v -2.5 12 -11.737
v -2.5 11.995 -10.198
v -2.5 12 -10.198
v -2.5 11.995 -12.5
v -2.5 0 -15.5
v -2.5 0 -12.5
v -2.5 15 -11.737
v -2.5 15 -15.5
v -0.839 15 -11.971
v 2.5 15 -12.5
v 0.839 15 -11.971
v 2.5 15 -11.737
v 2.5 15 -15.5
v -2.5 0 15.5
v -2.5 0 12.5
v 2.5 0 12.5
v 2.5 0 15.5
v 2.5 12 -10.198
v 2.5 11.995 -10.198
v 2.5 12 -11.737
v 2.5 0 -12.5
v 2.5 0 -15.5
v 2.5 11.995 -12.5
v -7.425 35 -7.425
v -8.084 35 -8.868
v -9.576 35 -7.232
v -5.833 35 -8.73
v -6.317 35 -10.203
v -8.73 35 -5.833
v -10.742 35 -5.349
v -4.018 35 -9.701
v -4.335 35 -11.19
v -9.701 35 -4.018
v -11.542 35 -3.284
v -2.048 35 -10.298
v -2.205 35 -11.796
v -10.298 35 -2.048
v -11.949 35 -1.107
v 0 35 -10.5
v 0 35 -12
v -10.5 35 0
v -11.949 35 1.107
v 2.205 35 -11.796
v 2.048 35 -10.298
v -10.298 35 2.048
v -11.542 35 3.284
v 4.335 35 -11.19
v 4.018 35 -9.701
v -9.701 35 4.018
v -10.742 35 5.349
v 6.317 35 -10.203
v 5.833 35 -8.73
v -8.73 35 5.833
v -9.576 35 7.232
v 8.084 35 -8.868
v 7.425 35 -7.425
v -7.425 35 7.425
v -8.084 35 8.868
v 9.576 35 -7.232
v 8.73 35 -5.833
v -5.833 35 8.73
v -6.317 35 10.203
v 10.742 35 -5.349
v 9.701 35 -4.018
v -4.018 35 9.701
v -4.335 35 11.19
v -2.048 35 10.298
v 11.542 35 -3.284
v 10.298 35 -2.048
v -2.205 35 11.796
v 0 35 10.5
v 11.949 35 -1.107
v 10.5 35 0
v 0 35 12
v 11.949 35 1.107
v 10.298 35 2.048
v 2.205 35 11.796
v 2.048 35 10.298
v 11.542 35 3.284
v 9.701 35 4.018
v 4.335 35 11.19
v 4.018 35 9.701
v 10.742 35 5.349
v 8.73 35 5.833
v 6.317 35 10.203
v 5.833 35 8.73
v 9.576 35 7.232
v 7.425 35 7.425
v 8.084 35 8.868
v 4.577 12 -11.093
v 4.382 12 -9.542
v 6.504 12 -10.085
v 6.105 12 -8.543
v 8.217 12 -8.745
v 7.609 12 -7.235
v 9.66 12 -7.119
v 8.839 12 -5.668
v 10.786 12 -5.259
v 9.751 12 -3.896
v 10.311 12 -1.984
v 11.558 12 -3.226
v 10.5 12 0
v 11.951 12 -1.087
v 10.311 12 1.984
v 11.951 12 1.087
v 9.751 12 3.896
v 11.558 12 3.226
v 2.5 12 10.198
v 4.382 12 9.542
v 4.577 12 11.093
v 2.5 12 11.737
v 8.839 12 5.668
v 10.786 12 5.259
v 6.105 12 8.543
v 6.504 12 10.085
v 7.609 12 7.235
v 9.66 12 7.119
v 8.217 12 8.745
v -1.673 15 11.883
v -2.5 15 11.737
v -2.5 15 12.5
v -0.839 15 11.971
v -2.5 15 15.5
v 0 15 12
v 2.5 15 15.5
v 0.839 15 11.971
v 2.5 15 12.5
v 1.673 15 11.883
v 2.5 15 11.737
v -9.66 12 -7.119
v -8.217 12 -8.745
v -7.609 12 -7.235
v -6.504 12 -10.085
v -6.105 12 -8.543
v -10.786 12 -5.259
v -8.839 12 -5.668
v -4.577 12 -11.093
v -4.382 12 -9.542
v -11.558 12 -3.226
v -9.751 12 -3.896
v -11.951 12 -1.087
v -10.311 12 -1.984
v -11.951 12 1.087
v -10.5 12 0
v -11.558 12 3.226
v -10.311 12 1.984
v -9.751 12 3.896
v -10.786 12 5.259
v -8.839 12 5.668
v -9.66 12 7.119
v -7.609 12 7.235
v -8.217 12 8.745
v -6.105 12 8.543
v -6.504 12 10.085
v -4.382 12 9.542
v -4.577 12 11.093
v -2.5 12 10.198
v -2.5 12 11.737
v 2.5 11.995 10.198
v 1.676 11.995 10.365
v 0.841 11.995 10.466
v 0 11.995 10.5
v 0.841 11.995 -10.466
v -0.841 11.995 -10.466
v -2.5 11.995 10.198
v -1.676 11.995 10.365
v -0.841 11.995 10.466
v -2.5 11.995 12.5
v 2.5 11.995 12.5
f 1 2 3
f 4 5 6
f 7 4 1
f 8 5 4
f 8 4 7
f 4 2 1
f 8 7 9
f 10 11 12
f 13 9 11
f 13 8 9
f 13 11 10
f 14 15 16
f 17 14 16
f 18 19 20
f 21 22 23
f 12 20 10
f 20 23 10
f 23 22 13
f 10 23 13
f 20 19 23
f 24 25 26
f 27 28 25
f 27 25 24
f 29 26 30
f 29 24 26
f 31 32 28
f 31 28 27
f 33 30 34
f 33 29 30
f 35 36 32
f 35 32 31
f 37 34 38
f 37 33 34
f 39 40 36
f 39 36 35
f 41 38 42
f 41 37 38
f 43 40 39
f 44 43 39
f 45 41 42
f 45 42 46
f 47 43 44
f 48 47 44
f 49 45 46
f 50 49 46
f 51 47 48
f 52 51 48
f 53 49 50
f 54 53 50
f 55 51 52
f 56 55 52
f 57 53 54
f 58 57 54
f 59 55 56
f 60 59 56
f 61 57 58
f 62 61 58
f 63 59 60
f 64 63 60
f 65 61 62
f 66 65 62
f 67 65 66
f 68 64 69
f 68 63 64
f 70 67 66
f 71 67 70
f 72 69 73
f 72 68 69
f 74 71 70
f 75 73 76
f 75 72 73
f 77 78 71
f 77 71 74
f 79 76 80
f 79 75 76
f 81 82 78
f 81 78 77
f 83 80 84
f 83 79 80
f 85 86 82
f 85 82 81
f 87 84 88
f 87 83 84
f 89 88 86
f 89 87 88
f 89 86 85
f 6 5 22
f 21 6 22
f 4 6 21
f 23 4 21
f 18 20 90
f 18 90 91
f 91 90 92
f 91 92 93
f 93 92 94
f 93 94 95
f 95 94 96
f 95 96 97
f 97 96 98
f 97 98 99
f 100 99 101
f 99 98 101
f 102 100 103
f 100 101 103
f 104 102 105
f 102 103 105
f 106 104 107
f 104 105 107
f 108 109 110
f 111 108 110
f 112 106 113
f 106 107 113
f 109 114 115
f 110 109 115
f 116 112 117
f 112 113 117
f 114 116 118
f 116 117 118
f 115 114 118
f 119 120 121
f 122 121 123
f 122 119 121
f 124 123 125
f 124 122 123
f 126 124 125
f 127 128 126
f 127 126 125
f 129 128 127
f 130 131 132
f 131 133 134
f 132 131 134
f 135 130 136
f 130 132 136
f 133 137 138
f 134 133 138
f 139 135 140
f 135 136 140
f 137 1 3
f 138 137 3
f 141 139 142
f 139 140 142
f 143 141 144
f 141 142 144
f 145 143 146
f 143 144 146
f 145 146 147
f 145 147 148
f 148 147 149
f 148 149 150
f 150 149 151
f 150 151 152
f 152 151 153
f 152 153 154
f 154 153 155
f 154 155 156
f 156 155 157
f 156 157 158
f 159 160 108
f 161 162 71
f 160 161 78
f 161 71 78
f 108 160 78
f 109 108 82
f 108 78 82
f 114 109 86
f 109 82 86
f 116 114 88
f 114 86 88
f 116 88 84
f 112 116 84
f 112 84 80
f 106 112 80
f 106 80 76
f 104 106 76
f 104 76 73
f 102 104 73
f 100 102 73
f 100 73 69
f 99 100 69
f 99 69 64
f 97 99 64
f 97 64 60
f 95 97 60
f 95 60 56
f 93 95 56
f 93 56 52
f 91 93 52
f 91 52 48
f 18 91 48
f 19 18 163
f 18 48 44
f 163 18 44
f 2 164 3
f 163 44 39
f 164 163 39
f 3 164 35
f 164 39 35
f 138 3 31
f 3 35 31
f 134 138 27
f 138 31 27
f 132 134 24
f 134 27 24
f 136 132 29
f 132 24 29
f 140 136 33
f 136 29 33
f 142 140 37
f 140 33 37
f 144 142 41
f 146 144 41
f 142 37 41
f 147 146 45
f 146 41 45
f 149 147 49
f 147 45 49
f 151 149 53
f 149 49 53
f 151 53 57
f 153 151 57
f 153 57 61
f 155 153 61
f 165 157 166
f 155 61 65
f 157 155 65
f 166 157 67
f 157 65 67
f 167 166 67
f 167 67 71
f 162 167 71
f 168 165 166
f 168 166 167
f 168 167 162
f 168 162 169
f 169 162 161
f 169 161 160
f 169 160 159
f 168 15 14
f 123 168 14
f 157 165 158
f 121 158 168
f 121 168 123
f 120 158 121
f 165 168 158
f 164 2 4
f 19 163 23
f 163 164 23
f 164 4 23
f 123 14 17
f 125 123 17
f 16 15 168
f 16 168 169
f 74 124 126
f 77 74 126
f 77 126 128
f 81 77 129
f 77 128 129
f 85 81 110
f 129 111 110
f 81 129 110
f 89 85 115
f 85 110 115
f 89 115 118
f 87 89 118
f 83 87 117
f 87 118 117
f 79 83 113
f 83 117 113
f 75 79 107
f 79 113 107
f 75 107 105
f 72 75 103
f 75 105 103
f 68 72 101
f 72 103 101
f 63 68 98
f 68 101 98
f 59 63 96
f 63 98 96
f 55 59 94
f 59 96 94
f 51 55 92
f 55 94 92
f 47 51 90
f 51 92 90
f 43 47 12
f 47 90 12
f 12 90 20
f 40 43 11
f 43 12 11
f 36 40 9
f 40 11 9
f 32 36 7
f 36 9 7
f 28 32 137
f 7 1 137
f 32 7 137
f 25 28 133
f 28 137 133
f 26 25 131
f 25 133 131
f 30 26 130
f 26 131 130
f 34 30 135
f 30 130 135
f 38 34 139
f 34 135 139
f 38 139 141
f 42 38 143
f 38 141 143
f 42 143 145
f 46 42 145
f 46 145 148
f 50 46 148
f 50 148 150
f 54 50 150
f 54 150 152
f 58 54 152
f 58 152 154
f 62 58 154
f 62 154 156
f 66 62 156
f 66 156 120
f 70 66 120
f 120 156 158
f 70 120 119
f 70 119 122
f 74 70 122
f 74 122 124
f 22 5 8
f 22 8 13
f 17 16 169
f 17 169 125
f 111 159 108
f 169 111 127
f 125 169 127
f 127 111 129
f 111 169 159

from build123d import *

# Parameters (mm, degrees)
SKETCH1_W                = 5
SKETCH1_H                = 3
BOSS_EXTRUDE1_DEPTH      = 15
BOSS_EXTRUDE1_2_DEPTH    = 15
BOSS_EXTRUDE2_DEPTH      = 20
BOSS_EXTRUDE2_DEPTH_BACK = 3
SKETCH2_R                = 12
SKETCH4_W                = 5
SKETCH4_H                = 3.004832049
BOSS_EXTRUDE3_DEPTH      = 28
SKETCH3_R                = 10.5
CUT_EXTRUDE1_DEPTH       = 25


with BuildPart() as part:
    # Sketch1 → Boss-Extrude1 (new body)
    with BuildSketch(Plane(origin=(0, 0, 0), x_dir=(1, 0, 0), z_dir=(0, 1, 0))):
        with Locations((0, -14)):
            Rectangle(SKETCH1_W, SKETCH1_H)
    extrude(amount=BOSS_EXTRUDE1_DEPTH)



with BuildPart() as body_2:
    # Sketch1 → Boss-Extrude1 2 (new body)
    with BuildSketch(Plane(origin=(0, 0, 0), x_dir=(1, 0, 0), z_dir=(0, 1, 0))):
        with Locations((0, 14)):
            Rectangle(SKETCH1_W, SKETCH1_H)
    extrude(amount=BOSS_EXTRUDE1_2_DEPTH)


with BuildPart() as body_3:
    # Sketch2 → Boss-Extrude2 (new, two sides: drawn at the far end of the back side and taken through both)
    with BuildSketch(Plane(origin=(0, 15, 0), x_dir=(1, 0, 0), z_dir=(0, 1, 0)).offset(-BOSS_EXTRUDE2_DEPTH_BACK)):
        with Locations(Location((0, 0, 0), (0, 0, 270))):
            Circle(SKETCH2_R)
    extrude(amount=BOSS_EXTRUDE2_DEPTH + BOSS_EXTRUDE2_DEPTH_BACK)


with BuildPart() as part_1:
    add(part.part)

    add(body_2.part)  # Boss-Extrude3 merges body 2

    add(body_3.part)  # Boss-Extrude3 merges body 3
    # Sketch4 → Boss-Extrude3 (add)
    with BuildSketch(Plane.XY.offset(-12.5)):
        with Locations((0, 13.497583976)):
            Rectangle(SKETCH4_W, SKETCH4_H)
    extrude(amount=BOSS_EXTRUDE3_DEPTH)

    # Sketch3 → Cut-Extrude1 (cut)
    with BuildSketch(Plane(origin=(0, 35, 0), x_dir=(1, 0, 0), z_dir=(0, 1, 0))):
        with Locations(Location((0, 0, 0), (0, 0, 270))):
            Circle(SKETCH3_R)
    extrude(amount=-CUT_EXTRUDE1_DEPTH, mode=Mode.SUBTRACT)


solid = part_1.part
